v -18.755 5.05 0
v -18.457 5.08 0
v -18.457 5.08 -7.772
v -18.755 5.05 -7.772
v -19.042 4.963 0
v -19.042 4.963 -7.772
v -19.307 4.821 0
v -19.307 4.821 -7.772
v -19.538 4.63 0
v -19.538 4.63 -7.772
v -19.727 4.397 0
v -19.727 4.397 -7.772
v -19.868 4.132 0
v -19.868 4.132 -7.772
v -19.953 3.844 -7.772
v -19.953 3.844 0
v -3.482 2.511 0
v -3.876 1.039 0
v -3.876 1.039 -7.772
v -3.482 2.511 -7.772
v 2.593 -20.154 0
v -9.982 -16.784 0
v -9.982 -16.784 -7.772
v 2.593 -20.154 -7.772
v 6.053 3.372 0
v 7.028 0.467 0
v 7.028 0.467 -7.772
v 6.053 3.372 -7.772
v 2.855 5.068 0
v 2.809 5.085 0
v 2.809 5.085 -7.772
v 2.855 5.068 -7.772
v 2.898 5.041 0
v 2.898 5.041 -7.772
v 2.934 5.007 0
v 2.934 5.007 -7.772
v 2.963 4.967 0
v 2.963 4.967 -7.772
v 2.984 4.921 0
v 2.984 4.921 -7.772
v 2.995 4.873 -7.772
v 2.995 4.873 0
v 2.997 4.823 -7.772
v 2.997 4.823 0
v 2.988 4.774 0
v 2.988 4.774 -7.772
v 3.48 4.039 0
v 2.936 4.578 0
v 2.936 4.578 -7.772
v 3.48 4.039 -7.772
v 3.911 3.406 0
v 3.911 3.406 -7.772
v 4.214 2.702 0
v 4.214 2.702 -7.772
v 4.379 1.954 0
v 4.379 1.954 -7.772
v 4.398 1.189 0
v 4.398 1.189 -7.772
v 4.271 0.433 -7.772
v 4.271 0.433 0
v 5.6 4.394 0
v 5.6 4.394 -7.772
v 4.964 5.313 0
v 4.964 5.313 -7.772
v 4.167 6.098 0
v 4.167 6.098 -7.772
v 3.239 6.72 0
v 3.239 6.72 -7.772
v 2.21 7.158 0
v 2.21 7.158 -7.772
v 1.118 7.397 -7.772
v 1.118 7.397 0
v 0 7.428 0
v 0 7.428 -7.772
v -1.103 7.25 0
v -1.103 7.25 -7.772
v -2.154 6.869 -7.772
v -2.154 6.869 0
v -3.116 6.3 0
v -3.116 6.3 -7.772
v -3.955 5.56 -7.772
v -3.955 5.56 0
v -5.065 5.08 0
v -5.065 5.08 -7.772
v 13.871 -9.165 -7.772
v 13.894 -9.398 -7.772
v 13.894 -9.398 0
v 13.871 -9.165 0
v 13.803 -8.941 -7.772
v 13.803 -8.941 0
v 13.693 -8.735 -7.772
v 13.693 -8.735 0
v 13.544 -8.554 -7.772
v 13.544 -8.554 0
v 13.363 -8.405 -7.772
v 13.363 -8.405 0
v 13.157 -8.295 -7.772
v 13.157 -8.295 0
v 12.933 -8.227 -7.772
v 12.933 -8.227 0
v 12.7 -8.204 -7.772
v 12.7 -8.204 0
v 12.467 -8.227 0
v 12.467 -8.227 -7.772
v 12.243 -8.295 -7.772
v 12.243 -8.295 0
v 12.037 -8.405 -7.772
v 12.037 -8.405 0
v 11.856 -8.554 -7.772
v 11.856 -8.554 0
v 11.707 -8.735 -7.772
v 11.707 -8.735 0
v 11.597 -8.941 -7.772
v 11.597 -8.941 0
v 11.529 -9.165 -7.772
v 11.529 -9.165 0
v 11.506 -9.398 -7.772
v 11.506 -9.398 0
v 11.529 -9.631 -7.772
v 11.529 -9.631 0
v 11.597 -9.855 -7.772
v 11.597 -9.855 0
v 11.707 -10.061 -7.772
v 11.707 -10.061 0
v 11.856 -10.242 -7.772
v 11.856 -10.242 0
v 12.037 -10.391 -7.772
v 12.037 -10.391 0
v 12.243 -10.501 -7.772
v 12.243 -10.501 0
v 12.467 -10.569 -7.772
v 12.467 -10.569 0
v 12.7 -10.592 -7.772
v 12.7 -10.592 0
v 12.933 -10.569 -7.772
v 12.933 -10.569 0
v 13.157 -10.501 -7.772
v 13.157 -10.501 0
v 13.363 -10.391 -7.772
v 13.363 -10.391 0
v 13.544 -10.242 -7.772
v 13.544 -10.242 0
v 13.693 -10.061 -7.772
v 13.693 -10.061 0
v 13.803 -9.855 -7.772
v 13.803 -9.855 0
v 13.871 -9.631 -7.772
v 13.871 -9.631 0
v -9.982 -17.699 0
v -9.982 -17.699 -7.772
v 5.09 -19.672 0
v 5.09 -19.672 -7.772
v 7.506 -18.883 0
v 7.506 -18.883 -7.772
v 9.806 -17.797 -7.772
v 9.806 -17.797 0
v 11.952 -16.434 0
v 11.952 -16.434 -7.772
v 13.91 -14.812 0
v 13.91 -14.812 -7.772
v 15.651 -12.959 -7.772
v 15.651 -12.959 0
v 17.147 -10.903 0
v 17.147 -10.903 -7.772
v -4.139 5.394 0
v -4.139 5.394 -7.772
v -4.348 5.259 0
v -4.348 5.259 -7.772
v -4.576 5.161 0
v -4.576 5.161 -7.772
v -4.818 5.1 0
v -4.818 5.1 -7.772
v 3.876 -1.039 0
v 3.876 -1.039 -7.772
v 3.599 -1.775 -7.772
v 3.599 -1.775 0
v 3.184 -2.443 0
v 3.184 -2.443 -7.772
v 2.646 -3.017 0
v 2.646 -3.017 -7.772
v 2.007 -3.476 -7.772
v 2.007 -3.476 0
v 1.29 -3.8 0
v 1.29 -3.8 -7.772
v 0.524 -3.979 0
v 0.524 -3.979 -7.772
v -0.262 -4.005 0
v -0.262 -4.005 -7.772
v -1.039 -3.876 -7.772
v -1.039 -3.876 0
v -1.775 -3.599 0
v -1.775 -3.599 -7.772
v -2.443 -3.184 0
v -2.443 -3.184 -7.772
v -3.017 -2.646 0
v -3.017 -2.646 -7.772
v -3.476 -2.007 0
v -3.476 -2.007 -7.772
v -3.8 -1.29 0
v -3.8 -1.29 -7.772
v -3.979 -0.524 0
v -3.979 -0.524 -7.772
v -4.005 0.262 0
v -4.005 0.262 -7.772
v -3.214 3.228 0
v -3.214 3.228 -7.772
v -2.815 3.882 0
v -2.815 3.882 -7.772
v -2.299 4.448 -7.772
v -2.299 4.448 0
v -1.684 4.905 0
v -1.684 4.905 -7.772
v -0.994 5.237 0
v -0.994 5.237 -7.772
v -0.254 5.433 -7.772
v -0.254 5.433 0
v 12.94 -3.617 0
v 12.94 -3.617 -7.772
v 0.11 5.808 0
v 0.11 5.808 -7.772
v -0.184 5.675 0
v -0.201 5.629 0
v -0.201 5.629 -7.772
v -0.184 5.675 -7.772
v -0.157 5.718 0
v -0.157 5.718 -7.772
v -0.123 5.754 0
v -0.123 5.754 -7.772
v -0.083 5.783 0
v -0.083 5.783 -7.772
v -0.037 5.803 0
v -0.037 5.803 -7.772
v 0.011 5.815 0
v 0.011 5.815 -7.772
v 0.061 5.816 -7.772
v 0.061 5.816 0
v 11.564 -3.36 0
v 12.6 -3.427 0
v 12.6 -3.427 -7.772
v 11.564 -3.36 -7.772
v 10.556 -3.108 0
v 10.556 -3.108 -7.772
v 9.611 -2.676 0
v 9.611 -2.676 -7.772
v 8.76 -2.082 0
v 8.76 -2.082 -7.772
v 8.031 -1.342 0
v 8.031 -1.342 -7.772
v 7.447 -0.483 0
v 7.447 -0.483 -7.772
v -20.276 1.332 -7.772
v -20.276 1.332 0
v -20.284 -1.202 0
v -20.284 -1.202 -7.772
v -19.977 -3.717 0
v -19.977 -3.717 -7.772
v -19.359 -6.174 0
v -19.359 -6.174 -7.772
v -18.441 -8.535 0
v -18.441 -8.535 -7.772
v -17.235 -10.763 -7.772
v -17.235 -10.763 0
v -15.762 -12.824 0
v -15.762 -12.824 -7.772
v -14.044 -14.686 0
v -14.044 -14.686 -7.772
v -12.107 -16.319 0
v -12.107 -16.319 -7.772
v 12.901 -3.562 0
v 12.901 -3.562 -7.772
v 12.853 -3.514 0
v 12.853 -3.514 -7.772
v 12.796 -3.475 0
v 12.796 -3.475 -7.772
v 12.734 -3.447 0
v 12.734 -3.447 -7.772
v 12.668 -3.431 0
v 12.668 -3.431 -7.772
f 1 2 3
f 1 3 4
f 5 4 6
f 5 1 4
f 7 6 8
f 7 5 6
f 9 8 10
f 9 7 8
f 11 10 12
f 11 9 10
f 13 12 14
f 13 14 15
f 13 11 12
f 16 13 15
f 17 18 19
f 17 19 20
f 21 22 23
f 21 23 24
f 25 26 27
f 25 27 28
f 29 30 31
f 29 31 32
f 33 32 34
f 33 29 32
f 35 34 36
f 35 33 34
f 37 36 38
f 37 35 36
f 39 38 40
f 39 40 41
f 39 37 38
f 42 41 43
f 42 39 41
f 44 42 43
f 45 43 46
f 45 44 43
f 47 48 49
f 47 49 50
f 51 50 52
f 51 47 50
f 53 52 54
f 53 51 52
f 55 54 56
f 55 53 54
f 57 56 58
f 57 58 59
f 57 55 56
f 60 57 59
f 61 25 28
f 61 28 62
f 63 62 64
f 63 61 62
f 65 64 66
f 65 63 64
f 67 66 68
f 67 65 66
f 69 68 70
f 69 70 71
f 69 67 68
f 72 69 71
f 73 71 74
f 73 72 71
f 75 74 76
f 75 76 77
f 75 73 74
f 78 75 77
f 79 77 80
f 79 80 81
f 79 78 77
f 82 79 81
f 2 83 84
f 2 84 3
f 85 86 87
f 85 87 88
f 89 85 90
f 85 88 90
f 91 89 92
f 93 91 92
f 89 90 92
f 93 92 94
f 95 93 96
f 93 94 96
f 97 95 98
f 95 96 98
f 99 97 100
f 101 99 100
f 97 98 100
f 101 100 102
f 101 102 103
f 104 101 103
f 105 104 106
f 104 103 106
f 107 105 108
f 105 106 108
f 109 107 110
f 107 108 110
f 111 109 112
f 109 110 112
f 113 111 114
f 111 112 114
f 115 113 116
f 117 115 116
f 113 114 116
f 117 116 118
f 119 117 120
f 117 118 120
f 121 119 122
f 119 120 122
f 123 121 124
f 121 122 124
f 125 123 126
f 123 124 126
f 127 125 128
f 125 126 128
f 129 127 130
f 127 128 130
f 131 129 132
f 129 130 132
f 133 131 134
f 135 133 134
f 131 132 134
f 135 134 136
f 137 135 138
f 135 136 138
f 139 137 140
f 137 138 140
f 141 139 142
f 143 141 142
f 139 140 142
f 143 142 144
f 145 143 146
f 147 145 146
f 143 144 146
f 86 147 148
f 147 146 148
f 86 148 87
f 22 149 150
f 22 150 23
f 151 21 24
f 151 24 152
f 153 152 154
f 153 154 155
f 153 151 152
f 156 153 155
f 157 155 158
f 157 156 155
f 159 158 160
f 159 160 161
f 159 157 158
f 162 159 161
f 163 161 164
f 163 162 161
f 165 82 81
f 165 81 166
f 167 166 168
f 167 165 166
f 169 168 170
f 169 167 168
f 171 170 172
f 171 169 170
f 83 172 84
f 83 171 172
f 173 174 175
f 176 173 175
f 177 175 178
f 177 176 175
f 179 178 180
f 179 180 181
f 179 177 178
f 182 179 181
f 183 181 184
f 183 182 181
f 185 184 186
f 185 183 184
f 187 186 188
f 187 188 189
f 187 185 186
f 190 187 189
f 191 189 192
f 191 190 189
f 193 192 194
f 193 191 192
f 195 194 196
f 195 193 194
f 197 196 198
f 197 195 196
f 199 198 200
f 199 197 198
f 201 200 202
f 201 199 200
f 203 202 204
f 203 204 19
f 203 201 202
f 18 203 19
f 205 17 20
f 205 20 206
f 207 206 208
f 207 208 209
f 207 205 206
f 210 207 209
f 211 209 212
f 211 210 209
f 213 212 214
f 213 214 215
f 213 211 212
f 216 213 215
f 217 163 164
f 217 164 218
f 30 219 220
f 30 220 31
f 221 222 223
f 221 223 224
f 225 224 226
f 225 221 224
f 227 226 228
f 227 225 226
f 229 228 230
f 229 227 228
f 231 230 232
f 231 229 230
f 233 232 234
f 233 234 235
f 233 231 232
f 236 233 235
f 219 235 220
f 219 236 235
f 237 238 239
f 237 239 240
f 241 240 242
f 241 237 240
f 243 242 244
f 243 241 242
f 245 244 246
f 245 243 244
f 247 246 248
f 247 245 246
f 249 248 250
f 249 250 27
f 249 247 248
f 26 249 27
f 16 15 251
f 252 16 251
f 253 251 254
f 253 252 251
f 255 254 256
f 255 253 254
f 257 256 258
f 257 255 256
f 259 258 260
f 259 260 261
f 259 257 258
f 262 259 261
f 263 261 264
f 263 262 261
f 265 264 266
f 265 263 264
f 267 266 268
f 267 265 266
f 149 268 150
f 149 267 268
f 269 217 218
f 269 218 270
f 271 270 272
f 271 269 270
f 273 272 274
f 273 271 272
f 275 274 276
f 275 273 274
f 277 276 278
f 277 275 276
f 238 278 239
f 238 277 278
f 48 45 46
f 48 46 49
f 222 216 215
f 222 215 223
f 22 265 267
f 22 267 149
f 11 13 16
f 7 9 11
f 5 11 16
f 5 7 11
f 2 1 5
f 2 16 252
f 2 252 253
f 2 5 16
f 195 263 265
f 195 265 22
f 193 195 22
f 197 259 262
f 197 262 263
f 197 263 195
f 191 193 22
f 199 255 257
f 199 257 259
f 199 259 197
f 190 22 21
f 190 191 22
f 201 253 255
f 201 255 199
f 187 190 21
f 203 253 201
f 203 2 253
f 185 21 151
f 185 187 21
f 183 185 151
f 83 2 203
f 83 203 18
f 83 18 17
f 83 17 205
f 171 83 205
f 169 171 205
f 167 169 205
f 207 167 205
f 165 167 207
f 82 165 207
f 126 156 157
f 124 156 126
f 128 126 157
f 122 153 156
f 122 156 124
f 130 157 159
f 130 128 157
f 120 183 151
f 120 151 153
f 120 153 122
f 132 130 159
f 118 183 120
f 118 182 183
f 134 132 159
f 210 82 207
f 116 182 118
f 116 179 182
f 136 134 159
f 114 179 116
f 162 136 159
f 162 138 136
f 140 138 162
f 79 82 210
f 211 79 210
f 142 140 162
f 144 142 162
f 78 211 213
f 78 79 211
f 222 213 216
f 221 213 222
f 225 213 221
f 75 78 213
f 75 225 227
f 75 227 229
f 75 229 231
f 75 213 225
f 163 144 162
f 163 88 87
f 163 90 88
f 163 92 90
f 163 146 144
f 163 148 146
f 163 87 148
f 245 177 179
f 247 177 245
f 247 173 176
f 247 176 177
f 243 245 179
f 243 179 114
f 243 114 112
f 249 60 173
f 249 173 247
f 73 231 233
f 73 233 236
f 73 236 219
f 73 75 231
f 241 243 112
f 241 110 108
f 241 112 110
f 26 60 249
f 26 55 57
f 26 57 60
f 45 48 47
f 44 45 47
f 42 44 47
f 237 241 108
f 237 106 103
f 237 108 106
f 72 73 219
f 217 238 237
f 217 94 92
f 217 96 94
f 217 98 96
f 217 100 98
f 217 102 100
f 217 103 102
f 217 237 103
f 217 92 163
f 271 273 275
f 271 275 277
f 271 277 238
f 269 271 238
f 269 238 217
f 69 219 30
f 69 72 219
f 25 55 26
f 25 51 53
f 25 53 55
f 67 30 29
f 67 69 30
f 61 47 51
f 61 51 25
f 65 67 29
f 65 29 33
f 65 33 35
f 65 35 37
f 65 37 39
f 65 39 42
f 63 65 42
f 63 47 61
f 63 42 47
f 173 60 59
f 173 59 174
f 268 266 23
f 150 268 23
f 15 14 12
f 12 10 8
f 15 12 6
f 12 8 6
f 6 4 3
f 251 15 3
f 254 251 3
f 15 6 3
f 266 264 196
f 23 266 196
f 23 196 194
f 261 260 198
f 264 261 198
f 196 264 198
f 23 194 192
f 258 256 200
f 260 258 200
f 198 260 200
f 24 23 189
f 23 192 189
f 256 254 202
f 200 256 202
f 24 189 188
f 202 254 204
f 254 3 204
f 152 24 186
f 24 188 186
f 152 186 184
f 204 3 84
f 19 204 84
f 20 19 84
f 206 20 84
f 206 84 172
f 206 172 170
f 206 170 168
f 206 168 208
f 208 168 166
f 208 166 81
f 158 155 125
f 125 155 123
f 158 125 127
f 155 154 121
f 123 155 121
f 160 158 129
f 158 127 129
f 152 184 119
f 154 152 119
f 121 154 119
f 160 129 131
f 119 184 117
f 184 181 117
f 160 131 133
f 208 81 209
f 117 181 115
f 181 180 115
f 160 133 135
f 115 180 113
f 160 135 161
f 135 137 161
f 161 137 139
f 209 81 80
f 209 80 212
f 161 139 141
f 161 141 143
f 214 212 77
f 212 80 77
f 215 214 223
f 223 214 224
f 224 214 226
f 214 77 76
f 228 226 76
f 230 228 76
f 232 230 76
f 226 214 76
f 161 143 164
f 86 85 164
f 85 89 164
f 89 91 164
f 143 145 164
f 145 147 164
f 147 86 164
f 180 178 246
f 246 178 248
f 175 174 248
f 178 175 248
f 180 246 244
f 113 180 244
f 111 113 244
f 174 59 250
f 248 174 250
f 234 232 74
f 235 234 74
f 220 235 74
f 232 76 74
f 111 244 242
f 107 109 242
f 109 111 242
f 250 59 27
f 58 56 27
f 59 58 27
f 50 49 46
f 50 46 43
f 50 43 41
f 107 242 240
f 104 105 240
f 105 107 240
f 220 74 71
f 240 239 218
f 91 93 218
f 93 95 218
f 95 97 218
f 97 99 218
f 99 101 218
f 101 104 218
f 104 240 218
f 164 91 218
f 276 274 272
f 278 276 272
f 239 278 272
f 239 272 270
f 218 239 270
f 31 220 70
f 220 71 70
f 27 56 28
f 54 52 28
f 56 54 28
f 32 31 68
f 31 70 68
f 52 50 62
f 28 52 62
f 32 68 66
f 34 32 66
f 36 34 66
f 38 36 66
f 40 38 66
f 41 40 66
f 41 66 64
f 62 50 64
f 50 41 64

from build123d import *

# Parameters (mm, degrees)
SKETCH1_R           = 1.1938
BOSS_EXTRUDE1_DEPTH = 7.7724


with BuildPart() as part:
    # Sketch1 → Boss-Extrude1 (new body)
    with BuildSketch(Plane.XY):
        with BuildLine():
            Line((-5.065262452, 5.08), (-18.456556559, 5.08))
            ThreePointArc((-18.456556559, 5.08), (-19.426909517, 4.731155792), (-19.953034117, 3.844324324))
            ThreePointArc((-19.953034117, 3.844324324), (-18.44069754, -8.534815418), (-9.9822, -17.699098371))
            Line((-9.9822, -17.699098371), (-9.9822, -16.784328658))
            Line((-9.9822, -16.784328658), (2.593084415, -20.153865962))
            ThreePointArc((2.593084415, -20.153865962), (10.900004065, -17.149119843), (17.146958643, -10.903403565))
            Line((17.146958643, -10.903403565), (12.940315476, -3.61728387))
            ThreePointArc((12.940315476, -3.61728387), (12.796393961, -3.475289825), (12.60008731, -3.426922378))
            ThreePointArc((12.60008731, -3.426922378), (9.17217903, -2.398369889), (7.028137334, 0.467212181))
            Line((7.028137334, 0.467212181), (6.053096787, 3.371693793))
            ThreePointArc((6.053096787, 3.371693793), (1.669604011, 7.303273092), (-3.95481445, 5.560217822))
            ThreePointArc((-3.95481445, 5.560217822), (-4.460344292, 5.205196933), (-5.065262452, 5.08))
        make_face()
        with Locations((12.7, -9.398)):
            Circle(SKETCH1_R, mode=Mode.SUBTRACT)
        with BuildLine():
            Line((-3.876453526, 1.038692592), (-3.482013301, 2.510763551))
            ThreePointArc((-3.482013301, 2.510763551), (-2.298514325, 4.447599489), (-0.253578298, 5.432607064))
            Line((-0.253578298, 5.432607064), (-0.201054745, 5.628627633))
            ThreePointArc((-0.201054745, 5.628627633), (-0.082709585, 5.782858048), (0.110030452, 5.808232755))
            Line((0.110030452, 5.808232755), (2.808827211, 5.085092343))
            ThreePointArc((2.808827211, 5.085092343), (2.963057626, 4.966747183), (2.988432333, 4.774007146))
            Line((2.988432333, 4.774007146), (2.93590878, 4.577986577))
            ThreePointArc((2.93590878, 4.577986577), (4.214371541, 2.702476981), (4.270893751, 0.433378367))
            Line((4.270893751, 0.433378367), (3.876453526, -1.038692592))
            ThreePointArc((3.876453526, -1.038692592), (-1.038692592, -3.876453526), (-3.876453526, 1.038692592))
        make_face(mode=Mode.SUBTRACT)
    extrude(amount=-BOSS_EXTRUDE1_DEPTH)


solid = part.part
